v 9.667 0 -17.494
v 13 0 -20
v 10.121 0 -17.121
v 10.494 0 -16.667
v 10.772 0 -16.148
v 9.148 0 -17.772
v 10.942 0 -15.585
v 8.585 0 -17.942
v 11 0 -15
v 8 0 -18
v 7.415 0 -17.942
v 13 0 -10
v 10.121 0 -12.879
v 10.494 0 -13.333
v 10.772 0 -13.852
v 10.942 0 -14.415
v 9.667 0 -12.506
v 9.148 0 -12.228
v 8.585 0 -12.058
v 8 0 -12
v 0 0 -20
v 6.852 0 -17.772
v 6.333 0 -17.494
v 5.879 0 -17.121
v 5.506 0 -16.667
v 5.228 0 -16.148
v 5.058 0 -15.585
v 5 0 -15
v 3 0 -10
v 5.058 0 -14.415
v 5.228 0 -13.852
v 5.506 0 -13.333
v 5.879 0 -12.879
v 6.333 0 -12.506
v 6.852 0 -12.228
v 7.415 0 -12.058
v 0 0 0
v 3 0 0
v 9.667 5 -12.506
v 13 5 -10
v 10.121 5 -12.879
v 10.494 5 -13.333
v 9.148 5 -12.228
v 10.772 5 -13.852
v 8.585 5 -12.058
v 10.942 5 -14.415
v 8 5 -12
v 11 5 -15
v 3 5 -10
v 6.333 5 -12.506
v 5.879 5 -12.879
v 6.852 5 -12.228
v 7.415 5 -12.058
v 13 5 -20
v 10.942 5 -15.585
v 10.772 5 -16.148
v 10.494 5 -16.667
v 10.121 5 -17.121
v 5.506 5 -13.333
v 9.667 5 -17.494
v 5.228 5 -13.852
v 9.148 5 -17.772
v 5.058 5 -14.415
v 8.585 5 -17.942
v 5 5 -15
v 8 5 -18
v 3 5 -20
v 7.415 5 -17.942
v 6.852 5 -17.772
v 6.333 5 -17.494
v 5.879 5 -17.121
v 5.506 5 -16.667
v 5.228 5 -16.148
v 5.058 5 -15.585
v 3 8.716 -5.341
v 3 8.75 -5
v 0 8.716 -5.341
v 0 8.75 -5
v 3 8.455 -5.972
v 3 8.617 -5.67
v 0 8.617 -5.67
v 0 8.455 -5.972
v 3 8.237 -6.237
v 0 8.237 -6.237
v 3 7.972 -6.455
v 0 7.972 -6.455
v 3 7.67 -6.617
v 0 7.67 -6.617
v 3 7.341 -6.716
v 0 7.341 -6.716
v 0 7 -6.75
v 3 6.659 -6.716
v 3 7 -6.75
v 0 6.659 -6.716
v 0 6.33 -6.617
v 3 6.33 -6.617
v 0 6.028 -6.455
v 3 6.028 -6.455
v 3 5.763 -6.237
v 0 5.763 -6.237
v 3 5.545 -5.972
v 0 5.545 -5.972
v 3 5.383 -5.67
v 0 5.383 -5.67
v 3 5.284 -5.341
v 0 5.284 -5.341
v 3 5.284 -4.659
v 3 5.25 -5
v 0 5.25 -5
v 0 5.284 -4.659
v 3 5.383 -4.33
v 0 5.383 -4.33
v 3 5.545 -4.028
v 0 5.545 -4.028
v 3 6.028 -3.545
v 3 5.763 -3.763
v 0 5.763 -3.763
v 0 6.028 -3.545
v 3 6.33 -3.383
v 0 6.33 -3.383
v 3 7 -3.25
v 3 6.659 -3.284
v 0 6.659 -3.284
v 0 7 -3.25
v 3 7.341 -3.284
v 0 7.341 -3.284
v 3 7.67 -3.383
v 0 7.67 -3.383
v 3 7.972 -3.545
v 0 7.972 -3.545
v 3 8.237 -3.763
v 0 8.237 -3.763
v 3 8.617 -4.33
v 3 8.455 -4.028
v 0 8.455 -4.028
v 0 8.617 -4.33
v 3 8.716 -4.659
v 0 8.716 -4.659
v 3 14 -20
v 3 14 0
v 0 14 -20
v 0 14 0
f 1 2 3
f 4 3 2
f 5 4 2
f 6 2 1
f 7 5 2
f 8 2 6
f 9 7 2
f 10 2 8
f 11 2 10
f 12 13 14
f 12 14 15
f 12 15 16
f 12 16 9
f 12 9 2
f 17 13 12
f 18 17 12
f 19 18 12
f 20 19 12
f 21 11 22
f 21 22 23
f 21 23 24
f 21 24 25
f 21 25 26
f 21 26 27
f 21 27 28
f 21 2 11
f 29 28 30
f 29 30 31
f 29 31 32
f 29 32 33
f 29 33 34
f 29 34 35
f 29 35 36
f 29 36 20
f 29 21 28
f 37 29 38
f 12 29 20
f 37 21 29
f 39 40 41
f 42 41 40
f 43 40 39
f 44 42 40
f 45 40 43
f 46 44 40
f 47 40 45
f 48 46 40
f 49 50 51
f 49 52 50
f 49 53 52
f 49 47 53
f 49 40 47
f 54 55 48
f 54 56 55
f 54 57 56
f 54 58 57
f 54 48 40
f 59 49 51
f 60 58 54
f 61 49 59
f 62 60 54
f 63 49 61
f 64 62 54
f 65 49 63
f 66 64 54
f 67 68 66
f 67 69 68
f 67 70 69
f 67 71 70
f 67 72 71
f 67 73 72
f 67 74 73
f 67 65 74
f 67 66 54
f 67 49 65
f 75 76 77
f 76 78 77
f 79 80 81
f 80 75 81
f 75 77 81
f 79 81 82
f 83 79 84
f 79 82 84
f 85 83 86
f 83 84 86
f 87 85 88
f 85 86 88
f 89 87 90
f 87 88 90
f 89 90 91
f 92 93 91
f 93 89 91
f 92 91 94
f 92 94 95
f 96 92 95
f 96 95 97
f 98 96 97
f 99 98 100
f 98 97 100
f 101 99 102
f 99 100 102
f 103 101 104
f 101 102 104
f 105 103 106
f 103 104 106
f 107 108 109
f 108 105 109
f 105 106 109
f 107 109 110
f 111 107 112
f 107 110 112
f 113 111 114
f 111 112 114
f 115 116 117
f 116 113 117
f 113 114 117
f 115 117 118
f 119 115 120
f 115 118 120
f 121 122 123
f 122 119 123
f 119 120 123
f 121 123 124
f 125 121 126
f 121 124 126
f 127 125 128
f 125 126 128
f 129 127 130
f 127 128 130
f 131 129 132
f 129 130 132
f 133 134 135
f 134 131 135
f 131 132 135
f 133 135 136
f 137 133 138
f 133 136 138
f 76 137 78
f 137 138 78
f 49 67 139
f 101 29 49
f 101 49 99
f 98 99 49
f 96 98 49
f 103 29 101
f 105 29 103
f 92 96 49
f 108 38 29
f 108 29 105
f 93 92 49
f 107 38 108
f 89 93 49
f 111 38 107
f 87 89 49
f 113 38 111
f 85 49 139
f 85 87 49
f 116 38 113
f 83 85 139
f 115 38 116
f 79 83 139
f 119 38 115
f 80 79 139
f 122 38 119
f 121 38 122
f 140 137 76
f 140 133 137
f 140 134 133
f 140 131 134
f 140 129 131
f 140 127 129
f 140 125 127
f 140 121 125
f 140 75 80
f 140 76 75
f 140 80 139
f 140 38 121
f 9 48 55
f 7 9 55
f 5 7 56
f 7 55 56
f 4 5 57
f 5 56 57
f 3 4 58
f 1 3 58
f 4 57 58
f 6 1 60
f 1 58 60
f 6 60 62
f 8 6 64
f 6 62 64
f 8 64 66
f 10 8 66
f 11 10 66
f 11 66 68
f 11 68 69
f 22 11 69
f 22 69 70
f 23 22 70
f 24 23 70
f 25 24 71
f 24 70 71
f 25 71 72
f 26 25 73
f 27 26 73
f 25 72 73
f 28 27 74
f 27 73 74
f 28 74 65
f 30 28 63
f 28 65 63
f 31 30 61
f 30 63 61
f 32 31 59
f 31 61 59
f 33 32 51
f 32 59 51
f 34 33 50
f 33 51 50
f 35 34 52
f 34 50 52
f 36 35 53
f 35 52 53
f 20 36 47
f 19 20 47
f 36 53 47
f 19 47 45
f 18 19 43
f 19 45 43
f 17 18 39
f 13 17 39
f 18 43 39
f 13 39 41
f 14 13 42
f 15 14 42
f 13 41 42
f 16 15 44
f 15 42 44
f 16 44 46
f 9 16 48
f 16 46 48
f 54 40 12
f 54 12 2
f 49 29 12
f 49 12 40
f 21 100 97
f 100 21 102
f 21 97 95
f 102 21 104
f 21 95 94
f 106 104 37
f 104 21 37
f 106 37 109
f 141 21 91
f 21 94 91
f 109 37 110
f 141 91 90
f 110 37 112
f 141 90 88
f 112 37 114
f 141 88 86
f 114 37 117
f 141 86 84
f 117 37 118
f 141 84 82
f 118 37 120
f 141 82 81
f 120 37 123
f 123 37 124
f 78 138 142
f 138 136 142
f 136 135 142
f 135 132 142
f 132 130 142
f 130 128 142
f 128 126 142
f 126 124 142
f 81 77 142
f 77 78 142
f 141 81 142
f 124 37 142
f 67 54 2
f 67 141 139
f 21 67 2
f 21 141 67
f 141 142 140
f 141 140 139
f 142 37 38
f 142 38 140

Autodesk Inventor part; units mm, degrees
ref_plane "YZ Plane" through (0, 0, 0) normal (1, 0, 0) x (0, 1, 0)
ref_plane "XZ Plane" through (0, 0, 0) normal (0, 1, 0) x (-1, 0, 0)
ref_plane "XY Plane" through (0, 0, 0) normal (0, 0, 1) x (1, 0, 0)
sketch "Sketch2" plane through (0, 0, 0) normal (1, 0, 0) x (0, 1, 0)
  line L0 (0, 0) -> (14, 0)
  line L1 (14, 0) -> (14, -20)
  line L2 (14, -20) -> (0, -20)
  line L3 (0, -20) -> (0, 0)
  circle A0 centre (7, -5) radius 1.75
  circle A1 centre (7, -5) radius 3.5 construction
  point P0 (0, -10)
  point P1 (7, -20)
  dimension "d11" = 20
  dimension "d24" = 14
  dimension "d27" = 3.5
  dimension "d28" = 7
  dimension "d29" = 5
extrude "Extrusion1" add sketch "Sketch2" along normal blind 3
sketch "Sketch3" plane through (3, 0, 0) normal (1, 0, 0) x (0, 0, -1)
  line L0 (0, 0) -> (20, 0) projected
  line L1 (20, 0) -> (10, 0)
  line L2 (10, 0) -> (10, 5)
  line L3 (10, 5) -> (20, 5)
  line L4 (20, 5) -> (20, 0)
  point P0 (10, 0)
  dimension "d12" = 5
  dimension "d13" = 10
extrude "Extrusion2" add sketch "Sketch3" along normal blind 10
sketch "Sketch4" plane through (3, 5, -10) normal (0, 1, 0) x (1, 0, 0)
  circle A0 centre (5, 5) radius 3
  line L0 (10, 10) -> (10, 0) projected
  point P0 (-3, -10)
  point P1 (10, 5)
  dimension "d16" = 6
  dimension "d17" = 5
extrude "Extrusion3" cut sketch "Sketch4" against normal through all
properties part number "IRSensorMount"
